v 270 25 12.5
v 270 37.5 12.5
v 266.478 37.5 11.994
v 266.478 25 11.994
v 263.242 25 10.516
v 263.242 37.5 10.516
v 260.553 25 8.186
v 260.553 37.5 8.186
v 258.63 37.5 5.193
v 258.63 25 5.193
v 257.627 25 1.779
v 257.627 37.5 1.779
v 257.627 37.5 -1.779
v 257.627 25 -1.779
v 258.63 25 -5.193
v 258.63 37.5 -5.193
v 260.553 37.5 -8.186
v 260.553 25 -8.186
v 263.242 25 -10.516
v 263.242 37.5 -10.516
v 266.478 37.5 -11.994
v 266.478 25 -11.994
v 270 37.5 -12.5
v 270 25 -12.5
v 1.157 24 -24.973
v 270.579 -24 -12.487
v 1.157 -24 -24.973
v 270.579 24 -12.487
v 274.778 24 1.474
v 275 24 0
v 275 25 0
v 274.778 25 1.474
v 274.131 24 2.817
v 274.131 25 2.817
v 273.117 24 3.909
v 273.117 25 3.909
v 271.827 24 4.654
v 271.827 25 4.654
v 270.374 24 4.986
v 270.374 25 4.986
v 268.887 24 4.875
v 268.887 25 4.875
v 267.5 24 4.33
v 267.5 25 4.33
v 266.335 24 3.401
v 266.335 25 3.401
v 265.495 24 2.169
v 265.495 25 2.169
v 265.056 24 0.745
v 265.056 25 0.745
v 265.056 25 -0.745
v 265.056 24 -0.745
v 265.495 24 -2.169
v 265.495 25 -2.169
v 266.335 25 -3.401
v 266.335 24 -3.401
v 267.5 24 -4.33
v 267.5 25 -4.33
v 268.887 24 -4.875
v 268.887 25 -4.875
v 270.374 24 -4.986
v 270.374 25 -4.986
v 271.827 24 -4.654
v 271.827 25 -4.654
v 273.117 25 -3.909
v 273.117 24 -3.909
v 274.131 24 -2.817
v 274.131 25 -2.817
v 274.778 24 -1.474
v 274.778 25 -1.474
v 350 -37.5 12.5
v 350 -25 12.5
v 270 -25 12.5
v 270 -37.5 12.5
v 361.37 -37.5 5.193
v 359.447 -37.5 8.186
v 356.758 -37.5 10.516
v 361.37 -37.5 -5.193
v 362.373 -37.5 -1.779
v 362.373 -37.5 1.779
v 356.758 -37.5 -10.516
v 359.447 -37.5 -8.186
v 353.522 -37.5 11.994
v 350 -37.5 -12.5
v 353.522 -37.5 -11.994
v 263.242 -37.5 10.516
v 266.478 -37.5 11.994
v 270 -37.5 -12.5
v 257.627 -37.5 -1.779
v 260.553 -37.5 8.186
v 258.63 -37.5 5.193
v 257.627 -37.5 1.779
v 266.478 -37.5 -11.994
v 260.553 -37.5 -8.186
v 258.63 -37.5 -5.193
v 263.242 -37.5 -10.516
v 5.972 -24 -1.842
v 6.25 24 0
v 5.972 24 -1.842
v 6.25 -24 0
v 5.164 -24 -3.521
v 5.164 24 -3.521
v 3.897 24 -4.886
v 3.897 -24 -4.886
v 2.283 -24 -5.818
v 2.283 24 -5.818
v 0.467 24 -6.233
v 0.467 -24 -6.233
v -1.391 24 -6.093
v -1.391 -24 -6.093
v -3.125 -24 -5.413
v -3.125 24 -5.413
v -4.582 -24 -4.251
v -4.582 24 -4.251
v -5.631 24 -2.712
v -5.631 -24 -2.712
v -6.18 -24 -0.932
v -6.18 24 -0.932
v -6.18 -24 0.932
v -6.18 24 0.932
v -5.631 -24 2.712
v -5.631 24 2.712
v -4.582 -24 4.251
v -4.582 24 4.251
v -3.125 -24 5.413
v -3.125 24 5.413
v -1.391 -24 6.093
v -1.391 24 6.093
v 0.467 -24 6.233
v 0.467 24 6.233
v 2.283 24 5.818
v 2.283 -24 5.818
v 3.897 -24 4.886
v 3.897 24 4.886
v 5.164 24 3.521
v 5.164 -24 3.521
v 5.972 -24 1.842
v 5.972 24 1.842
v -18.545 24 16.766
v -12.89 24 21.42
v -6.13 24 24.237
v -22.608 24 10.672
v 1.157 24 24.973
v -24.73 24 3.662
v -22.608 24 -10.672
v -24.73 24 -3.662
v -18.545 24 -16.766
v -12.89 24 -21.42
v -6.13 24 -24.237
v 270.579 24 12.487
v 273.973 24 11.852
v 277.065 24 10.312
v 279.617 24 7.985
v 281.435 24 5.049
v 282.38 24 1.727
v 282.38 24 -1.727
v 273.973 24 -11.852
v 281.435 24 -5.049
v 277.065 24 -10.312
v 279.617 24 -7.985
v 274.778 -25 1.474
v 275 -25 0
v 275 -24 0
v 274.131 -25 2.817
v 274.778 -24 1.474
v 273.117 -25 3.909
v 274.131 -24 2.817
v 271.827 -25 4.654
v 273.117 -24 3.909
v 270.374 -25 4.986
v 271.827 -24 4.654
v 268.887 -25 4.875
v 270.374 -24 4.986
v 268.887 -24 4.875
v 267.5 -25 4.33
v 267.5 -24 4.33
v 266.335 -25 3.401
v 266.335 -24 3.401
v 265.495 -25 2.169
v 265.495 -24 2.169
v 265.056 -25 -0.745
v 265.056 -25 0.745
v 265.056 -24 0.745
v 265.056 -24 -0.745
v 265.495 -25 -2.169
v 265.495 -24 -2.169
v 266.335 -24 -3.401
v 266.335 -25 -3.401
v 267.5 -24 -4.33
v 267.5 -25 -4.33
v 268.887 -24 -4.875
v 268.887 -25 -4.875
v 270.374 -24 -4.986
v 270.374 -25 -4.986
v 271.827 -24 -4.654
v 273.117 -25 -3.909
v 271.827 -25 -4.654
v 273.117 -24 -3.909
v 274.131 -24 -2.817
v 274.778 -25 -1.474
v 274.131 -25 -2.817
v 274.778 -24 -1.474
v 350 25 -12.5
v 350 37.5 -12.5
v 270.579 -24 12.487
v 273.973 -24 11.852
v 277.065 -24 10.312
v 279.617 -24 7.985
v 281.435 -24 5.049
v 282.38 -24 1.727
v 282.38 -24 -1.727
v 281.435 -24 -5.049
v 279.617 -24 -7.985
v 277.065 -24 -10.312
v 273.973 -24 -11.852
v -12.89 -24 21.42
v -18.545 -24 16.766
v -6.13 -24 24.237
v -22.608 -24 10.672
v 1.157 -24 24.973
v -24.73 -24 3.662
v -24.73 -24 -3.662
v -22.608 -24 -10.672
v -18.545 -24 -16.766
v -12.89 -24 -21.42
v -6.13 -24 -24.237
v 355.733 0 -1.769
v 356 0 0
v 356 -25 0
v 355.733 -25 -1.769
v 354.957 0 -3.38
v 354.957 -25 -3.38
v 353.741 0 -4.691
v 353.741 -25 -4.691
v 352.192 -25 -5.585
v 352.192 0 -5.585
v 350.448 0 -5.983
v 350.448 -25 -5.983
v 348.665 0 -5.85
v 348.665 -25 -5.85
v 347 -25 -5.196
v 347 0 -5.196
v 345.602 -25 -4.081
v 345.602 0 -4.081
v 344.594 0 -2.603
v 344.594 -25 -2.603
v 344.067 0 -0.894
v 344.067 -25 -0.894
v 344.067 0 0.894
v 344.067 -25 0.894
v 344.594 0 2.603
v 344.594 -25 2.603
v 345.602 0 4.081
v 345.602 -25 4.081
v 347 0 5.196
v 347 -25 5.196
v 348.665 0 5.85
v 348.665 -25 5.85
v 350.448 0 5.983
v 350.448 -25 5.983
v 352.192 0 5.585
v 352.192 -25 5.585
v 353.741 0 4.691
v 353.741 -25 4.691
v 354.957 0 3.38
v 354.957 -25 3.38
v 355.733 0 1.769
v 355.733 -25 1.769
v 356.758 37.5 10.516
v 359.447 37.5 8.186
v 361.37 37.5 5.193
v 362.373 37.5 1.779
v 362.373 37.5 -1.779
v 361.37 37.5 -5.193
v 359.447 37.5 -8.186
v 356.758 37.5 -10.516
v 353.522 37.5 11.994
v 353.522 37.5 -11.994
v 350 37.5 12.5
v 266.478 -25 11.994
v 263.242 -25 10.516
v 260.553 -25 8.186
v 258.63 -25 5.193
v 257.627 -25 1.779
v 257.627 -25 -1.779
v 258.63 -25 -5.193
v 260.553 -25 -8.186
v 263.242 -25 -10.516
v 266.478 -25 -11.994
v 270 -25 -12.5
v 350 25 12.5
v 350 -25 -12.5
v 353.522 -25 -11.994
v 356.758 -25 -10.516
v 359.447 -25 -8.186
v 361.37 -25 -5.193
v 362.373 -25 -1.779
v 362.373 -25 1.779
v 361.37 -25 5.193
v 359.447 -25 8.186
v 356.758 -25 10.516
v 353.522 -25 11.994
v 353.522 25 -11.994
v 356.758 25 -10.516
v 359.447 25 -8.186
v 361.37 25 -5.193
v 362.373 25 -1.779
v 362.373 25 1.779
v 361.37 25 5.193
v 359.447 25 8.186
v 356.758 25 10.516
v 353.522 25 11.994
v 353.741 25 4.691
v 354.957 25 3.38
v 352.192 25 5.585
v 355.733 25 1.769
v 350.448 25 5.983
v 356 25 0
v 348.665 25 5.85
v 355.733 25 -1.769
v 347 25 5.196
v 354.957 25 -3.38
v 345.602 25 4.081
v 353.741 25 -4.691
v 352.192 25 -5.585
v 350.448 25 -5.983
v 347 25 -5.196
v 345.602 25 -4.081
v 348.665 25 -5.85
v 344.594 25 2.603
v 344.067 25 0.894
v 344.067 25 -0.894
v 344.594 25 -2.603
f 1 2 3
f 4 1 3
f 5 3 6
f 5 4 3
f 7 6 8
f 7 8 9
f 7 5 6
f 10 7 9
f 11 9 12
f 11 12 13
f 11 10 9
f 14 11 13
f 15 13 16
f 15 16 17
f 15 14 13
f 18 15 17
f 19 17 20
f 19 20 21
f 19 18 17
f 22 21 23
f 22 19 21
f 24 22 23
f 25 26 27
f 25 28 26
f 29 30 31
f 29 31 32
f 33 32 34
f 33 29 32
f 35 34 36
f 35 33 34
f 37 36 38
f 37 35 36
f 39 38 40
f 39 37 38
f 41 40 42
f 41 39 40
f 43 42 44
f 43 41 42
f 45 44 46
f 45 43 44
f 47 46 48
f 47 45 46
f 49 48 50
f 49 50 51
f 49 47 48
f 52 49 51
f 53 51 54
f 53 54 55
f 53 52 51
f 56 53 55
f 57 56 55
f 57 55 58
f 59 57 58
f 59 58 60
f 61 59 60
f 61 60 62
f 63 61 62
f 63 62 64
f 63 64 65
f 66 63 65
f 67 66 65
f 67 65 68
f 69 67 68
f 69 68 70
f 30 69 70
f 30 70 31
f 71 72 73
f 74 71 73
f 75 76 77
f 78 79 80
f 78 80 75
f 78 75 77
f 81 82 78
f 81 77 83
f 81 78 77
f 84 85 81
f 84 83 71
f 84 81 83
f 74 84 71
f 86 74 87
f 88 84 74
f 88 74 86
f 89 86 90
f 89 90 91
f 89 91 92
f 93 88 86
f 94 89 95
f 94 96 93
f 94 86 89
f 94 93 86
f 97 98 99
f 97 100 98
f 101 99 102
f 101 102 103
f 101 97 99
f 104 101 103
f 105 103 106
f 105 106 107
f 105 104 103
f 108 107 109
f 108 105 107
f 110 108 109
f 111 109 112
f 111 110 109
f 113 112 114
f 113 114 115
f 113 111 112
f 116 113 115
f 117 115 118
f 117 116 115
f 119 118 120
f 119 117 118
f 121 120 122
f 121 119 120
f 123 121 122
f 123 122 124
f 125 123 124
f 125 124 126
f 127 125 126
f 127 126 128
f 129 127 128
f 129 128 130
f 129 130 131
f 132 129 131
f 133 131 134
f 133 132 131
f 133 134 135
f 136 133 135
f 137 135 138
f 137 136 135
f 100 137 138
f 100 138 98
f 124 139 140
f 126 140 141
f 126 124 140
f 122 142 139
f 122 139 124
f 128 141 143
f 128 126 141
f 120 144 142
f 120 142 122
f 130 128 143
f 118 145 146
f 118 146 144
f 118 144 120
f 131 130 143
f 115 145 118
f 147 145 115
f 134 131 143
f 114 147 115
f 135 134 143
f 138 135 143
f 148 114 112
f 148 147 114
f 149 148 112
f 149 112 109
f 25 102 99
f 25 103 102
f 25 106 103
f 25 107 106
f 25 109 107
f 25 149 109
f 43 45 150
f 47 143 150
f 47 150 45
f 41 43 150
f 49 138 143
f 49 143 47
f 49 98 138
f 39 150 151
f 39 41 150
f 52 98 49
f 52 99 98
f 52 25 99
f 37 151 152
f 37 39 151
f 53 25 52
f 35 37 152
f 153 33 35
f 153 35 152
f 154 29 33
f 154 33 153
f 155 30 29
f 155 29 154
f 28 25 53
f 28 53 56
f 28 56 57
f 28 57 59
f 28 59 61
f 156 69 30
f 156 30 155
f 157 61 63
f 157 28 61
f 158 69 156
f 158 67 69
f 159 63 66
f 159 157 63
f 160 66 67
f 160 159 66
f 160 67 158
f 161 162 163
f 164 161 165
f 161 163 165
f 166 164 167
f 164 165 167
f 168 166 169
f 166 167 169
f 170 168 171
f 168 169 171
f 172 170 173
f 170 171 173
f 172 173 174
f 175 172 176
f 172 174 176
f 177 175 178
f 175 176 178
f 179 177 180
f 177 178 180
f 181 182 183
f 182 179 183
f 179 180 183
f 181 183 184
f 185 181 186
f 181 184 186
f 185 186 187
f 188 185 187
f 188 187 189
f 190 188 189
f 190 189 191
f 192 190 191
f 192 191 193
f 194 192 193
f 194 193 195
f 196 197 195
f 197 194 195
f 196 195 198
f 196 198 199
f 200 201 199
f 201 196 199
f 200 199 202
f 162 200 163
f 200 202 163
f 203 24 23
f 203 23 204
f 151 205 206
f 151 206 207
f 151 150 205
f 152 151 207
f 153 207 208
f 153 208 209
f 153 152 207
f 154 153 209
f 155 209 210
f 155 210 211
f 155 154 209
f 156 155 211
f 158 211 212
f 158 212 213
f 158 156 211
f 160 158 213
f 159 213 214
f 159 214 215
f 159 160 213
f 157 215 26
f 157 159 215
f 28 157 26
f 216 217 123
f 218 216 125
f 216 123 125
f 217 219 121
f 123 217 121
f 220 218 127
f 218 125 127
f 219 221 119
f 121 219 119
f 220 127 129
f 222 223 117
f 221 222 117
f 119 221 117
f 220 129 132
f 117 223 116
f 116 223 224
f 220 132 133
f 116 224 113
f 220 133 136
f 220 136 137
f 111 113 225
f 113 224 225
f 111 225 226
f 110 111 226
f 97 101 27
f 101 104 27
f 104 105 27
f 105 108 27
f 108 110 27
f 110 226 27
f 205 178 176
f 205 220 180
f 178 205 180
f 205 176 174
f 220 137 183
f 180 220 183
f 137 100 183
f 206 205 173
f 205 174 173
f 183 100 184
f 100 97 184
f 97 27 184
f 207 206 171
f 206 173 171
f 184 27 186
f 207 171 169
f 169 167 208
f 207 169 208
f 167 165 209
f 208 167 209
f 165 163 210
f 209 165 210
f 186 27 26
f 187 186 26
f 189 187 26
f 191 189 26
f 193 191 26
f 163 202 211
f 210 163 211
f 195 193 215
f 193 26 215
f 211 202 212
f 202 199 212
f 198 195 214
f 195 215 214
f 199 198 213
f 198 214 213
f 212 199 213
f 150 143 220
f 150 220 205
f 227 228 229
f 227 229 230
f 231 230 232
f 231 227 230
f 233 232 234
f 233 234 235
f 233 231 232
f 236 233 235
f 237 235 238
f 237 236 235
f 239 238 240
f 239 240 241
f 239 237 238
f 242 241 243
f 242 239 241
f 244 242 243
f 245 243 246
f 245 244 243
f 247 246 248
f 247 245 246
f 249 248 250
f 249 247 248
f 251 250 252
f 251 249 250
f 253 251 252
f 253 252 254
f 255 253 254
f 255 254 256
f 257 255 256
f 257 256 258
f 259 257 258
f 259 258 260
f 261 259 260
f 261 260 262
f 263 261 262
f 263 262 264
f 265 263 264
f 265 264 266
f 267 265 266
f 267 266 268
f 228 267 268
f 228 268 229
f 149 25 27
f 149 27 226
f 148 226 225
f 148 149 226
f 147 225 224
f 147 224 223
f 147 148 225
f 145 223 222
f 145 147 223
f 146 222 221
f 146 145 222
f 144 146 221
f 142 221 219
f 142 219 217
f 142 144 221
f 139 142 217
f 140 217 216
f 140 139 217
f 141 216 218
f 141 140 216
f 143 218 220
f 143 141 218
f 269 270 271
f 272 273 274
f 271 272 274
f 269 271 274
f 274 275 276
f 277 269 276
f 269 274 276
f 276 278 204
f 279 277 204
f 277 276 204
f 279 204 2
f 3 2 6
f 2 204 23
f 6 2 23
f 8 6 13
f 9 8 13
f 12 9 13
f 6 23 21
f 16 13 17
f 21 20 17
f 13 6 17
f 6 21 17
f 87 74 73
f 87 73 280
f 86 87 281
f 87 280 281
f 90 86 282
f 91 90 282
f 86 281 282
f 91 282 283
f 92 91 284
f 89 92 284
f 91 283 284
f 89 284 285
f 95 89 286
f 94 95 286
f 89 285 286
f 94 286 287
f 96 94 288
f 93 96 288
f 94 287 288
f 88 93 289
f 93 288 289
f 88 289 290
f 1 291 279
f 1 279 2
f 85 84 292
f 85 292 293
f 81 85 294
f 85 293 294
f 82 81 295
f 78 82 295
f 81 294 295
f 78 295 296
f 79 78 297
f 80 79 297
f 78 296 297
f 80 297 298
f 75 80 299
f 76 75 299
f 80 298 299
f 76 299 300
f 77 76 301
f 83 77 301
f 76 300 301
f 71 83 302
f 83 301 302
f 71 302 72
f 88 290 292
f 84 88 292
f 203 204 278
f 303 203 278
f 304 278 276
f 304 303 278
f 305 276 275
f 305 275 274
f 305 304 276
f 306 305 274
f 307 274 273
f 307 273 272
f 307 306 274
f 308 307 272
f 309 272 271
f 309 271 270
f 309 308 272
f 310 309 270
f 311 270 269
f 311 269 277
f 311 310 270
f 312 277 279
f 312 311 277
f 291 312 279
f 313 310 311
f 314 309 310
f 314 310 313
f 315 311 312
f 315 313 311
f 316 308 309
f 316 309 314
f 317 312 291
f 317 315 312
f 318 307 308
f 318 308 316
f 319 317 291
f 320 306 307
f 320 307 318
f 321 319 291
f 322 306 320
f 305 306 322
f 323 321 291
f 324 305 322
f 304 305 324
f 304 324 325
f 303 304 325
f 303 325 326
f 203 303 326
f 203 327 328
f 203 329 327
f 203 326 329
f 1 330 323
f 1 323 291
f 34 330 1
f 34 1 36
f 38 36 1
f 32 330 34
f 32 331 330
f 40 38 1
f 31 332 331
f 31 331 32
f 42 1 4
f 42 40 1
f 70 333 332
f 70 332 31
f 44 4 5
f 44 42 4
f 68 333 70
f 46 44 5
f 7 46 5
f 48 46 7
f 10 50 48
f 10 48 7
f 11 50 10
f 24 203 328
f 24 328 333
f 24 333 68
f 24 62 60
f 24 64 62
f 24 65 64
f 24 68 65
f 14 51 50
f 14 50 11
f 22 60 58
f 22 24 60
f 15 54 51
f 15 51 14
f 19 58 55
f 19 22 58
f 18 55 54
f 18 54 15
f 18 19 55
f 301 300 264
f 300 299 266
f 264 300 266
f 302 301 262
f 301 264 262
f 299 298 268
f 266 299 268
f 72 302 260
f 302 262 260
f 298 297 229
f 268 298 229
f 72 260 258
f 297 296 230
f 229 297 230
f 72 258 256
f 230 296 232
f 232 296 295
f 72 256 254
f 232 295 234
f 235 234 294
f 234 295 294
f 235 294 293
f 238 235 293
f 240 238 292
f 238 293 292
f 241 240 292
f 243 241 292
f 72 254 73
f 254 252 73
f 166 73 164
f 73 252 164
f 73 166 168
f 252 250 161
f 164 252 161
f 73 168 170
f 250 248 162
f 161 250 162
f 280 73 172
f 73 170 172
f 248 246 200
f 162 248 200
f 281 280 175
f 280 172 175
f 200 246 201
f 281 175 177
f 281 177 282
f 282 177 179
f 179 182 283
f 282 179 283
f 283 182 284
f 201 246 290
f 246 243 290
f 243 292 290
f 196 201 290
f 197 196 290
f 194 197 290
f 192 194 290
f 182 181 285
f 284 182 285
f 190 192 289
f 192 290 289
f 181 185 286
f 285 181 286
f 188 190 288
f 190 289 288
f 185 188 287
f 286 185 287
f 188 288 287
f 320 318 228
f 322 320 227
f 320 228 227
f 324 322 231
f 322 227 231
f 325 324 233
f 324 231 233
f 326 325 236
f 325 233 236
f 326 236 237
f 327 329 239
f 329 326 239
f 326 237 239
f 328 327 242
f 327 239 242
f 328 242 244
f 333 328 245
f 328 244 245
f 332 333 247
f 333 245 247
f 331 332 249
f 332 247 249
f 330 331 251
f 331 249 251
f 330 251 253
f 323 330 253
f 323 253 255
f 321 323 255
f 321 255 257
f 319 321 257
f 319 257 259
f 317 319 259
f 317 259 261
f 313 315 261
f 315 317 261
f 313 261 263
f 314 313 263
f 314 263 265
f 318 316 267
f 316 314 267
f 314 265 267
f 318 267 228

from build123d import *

# Parameters (mm, degrees)
BOSS_EXTRUDE1_DEPTH      = 24
BOSS_EXTRUDE1_DEPTH_BACK = 24
SKETCH2_R                = 6.25
BOSS_EXTRUDE2_START      = 1
BOSS_EXTRUDE2_DEPTH      = 12.5
BOSS_EXTRUDE4_DEPTH      = 10
BOSS_EXTRUDE4_DEPTH_BACK = 54
SKETCH5_R                = 5
BOSS_EXTRUDE5_DEPTH      = 31
BOSS_EXTRUDE5_DEPTH_BACK = 30
SKETCH6_R                = 6


with BuildPart() as part:
    # Sketch2 → Boss-Extrude1 (new, two sides: drawn at the far end of the back side and taken through both)
    with BuildSketch(Plane(origin=(0, 0, 0), x_dir=(1, 0, 0), z_dir=(0, 1, 0)).offset(-BOSS_EXTRUDE1_DEPTH_BACK)):
        with BuildLine():
            Line((270.578703704, 12.486596895), (1.157407407, 24.97319379))
            ThreePointArc((1.157407407, 24.97319379), (-25, 0), (1.157407407, -24.97319379))
            Line((1.157407407, -24.97319379), (270.578703704, -12.486596895))
            ThreePointArc((270.578703704, -12.486596895), (282.5, 0), (270.578703704, 12.486596895))
        make_face()
        Circle(SKETCH2_R, mode=Mode.SUBTRACT)
    extrude(amount=BOSS_EXTRUDE1_DEPTH + BOSS_EXTRUDE1_DEPTH_BACK)



with BuildPart() as body_2:
    # Sketch3 → Boss-Extrude2 (new body)
    with BuildSketch(Plane(origin=(0, 24, 0), x_dir=(1, 0, 0), z_dir=(0, 1, 0)).offset(BOSS_EXTRUDE2_START)):
        with BuildLine():
            Line((270, 12.5), (350, 12.5))
            ThreePointArc((350, 12.5), (362.5, 0), (350, -12.5))
            Line((350, -12.5), (270, -12.5))
            ThreePointArc((270, -12.5), (257.5, 0), (270, 12.5))
        make_face()
    boss_extrude2 = extrude(amount=BOSS_EXTRUDE2_DEPTH)


with BuildPart() as part_1:
    add(part.part)

    add(body_2.part)  # Boss-Extrude4 merges body 2
    # Sketch5 → Boss-Extrude4 (add, two sides: drawn at the far end of the back side and taken through both)
    with BuildSketch(Plane.XZ.offset(24).offset(-BOSS_EXTRUDE4_DEPTH_BACK)):
        with Locations((270, 0)):
            Circle(SKETCH5_R)
    extrude(amount=BOSS_EXTRUDE4_DEPTH + BOSS_EXTRUDE4_DEPTH_BACK)

    # Mirror1: Boss-Extrude2 across plane
    add(boss_extrude2.mirror(Plane.ZX))

    # Sketch6 → Boss-Extrude5 (add, two sides: drawn at the far end of the back side and taken through both)
    with BuildSketch(Plane(origin=(0, 0, 0), x_dir=(1, 0, 0), z_dir=(0, 1, 0)).offset(-BOSS_EXTRUDE5_DEPTH_BACK)):
        with Locations((350, 0)):
            Circle(SKETCH6_R)
    extrude(amount=BOSS_EXTRUDE5_DEPTH + BOSS_EXTRUDE5_DEPTH_BACK)


solid = part_1.part
